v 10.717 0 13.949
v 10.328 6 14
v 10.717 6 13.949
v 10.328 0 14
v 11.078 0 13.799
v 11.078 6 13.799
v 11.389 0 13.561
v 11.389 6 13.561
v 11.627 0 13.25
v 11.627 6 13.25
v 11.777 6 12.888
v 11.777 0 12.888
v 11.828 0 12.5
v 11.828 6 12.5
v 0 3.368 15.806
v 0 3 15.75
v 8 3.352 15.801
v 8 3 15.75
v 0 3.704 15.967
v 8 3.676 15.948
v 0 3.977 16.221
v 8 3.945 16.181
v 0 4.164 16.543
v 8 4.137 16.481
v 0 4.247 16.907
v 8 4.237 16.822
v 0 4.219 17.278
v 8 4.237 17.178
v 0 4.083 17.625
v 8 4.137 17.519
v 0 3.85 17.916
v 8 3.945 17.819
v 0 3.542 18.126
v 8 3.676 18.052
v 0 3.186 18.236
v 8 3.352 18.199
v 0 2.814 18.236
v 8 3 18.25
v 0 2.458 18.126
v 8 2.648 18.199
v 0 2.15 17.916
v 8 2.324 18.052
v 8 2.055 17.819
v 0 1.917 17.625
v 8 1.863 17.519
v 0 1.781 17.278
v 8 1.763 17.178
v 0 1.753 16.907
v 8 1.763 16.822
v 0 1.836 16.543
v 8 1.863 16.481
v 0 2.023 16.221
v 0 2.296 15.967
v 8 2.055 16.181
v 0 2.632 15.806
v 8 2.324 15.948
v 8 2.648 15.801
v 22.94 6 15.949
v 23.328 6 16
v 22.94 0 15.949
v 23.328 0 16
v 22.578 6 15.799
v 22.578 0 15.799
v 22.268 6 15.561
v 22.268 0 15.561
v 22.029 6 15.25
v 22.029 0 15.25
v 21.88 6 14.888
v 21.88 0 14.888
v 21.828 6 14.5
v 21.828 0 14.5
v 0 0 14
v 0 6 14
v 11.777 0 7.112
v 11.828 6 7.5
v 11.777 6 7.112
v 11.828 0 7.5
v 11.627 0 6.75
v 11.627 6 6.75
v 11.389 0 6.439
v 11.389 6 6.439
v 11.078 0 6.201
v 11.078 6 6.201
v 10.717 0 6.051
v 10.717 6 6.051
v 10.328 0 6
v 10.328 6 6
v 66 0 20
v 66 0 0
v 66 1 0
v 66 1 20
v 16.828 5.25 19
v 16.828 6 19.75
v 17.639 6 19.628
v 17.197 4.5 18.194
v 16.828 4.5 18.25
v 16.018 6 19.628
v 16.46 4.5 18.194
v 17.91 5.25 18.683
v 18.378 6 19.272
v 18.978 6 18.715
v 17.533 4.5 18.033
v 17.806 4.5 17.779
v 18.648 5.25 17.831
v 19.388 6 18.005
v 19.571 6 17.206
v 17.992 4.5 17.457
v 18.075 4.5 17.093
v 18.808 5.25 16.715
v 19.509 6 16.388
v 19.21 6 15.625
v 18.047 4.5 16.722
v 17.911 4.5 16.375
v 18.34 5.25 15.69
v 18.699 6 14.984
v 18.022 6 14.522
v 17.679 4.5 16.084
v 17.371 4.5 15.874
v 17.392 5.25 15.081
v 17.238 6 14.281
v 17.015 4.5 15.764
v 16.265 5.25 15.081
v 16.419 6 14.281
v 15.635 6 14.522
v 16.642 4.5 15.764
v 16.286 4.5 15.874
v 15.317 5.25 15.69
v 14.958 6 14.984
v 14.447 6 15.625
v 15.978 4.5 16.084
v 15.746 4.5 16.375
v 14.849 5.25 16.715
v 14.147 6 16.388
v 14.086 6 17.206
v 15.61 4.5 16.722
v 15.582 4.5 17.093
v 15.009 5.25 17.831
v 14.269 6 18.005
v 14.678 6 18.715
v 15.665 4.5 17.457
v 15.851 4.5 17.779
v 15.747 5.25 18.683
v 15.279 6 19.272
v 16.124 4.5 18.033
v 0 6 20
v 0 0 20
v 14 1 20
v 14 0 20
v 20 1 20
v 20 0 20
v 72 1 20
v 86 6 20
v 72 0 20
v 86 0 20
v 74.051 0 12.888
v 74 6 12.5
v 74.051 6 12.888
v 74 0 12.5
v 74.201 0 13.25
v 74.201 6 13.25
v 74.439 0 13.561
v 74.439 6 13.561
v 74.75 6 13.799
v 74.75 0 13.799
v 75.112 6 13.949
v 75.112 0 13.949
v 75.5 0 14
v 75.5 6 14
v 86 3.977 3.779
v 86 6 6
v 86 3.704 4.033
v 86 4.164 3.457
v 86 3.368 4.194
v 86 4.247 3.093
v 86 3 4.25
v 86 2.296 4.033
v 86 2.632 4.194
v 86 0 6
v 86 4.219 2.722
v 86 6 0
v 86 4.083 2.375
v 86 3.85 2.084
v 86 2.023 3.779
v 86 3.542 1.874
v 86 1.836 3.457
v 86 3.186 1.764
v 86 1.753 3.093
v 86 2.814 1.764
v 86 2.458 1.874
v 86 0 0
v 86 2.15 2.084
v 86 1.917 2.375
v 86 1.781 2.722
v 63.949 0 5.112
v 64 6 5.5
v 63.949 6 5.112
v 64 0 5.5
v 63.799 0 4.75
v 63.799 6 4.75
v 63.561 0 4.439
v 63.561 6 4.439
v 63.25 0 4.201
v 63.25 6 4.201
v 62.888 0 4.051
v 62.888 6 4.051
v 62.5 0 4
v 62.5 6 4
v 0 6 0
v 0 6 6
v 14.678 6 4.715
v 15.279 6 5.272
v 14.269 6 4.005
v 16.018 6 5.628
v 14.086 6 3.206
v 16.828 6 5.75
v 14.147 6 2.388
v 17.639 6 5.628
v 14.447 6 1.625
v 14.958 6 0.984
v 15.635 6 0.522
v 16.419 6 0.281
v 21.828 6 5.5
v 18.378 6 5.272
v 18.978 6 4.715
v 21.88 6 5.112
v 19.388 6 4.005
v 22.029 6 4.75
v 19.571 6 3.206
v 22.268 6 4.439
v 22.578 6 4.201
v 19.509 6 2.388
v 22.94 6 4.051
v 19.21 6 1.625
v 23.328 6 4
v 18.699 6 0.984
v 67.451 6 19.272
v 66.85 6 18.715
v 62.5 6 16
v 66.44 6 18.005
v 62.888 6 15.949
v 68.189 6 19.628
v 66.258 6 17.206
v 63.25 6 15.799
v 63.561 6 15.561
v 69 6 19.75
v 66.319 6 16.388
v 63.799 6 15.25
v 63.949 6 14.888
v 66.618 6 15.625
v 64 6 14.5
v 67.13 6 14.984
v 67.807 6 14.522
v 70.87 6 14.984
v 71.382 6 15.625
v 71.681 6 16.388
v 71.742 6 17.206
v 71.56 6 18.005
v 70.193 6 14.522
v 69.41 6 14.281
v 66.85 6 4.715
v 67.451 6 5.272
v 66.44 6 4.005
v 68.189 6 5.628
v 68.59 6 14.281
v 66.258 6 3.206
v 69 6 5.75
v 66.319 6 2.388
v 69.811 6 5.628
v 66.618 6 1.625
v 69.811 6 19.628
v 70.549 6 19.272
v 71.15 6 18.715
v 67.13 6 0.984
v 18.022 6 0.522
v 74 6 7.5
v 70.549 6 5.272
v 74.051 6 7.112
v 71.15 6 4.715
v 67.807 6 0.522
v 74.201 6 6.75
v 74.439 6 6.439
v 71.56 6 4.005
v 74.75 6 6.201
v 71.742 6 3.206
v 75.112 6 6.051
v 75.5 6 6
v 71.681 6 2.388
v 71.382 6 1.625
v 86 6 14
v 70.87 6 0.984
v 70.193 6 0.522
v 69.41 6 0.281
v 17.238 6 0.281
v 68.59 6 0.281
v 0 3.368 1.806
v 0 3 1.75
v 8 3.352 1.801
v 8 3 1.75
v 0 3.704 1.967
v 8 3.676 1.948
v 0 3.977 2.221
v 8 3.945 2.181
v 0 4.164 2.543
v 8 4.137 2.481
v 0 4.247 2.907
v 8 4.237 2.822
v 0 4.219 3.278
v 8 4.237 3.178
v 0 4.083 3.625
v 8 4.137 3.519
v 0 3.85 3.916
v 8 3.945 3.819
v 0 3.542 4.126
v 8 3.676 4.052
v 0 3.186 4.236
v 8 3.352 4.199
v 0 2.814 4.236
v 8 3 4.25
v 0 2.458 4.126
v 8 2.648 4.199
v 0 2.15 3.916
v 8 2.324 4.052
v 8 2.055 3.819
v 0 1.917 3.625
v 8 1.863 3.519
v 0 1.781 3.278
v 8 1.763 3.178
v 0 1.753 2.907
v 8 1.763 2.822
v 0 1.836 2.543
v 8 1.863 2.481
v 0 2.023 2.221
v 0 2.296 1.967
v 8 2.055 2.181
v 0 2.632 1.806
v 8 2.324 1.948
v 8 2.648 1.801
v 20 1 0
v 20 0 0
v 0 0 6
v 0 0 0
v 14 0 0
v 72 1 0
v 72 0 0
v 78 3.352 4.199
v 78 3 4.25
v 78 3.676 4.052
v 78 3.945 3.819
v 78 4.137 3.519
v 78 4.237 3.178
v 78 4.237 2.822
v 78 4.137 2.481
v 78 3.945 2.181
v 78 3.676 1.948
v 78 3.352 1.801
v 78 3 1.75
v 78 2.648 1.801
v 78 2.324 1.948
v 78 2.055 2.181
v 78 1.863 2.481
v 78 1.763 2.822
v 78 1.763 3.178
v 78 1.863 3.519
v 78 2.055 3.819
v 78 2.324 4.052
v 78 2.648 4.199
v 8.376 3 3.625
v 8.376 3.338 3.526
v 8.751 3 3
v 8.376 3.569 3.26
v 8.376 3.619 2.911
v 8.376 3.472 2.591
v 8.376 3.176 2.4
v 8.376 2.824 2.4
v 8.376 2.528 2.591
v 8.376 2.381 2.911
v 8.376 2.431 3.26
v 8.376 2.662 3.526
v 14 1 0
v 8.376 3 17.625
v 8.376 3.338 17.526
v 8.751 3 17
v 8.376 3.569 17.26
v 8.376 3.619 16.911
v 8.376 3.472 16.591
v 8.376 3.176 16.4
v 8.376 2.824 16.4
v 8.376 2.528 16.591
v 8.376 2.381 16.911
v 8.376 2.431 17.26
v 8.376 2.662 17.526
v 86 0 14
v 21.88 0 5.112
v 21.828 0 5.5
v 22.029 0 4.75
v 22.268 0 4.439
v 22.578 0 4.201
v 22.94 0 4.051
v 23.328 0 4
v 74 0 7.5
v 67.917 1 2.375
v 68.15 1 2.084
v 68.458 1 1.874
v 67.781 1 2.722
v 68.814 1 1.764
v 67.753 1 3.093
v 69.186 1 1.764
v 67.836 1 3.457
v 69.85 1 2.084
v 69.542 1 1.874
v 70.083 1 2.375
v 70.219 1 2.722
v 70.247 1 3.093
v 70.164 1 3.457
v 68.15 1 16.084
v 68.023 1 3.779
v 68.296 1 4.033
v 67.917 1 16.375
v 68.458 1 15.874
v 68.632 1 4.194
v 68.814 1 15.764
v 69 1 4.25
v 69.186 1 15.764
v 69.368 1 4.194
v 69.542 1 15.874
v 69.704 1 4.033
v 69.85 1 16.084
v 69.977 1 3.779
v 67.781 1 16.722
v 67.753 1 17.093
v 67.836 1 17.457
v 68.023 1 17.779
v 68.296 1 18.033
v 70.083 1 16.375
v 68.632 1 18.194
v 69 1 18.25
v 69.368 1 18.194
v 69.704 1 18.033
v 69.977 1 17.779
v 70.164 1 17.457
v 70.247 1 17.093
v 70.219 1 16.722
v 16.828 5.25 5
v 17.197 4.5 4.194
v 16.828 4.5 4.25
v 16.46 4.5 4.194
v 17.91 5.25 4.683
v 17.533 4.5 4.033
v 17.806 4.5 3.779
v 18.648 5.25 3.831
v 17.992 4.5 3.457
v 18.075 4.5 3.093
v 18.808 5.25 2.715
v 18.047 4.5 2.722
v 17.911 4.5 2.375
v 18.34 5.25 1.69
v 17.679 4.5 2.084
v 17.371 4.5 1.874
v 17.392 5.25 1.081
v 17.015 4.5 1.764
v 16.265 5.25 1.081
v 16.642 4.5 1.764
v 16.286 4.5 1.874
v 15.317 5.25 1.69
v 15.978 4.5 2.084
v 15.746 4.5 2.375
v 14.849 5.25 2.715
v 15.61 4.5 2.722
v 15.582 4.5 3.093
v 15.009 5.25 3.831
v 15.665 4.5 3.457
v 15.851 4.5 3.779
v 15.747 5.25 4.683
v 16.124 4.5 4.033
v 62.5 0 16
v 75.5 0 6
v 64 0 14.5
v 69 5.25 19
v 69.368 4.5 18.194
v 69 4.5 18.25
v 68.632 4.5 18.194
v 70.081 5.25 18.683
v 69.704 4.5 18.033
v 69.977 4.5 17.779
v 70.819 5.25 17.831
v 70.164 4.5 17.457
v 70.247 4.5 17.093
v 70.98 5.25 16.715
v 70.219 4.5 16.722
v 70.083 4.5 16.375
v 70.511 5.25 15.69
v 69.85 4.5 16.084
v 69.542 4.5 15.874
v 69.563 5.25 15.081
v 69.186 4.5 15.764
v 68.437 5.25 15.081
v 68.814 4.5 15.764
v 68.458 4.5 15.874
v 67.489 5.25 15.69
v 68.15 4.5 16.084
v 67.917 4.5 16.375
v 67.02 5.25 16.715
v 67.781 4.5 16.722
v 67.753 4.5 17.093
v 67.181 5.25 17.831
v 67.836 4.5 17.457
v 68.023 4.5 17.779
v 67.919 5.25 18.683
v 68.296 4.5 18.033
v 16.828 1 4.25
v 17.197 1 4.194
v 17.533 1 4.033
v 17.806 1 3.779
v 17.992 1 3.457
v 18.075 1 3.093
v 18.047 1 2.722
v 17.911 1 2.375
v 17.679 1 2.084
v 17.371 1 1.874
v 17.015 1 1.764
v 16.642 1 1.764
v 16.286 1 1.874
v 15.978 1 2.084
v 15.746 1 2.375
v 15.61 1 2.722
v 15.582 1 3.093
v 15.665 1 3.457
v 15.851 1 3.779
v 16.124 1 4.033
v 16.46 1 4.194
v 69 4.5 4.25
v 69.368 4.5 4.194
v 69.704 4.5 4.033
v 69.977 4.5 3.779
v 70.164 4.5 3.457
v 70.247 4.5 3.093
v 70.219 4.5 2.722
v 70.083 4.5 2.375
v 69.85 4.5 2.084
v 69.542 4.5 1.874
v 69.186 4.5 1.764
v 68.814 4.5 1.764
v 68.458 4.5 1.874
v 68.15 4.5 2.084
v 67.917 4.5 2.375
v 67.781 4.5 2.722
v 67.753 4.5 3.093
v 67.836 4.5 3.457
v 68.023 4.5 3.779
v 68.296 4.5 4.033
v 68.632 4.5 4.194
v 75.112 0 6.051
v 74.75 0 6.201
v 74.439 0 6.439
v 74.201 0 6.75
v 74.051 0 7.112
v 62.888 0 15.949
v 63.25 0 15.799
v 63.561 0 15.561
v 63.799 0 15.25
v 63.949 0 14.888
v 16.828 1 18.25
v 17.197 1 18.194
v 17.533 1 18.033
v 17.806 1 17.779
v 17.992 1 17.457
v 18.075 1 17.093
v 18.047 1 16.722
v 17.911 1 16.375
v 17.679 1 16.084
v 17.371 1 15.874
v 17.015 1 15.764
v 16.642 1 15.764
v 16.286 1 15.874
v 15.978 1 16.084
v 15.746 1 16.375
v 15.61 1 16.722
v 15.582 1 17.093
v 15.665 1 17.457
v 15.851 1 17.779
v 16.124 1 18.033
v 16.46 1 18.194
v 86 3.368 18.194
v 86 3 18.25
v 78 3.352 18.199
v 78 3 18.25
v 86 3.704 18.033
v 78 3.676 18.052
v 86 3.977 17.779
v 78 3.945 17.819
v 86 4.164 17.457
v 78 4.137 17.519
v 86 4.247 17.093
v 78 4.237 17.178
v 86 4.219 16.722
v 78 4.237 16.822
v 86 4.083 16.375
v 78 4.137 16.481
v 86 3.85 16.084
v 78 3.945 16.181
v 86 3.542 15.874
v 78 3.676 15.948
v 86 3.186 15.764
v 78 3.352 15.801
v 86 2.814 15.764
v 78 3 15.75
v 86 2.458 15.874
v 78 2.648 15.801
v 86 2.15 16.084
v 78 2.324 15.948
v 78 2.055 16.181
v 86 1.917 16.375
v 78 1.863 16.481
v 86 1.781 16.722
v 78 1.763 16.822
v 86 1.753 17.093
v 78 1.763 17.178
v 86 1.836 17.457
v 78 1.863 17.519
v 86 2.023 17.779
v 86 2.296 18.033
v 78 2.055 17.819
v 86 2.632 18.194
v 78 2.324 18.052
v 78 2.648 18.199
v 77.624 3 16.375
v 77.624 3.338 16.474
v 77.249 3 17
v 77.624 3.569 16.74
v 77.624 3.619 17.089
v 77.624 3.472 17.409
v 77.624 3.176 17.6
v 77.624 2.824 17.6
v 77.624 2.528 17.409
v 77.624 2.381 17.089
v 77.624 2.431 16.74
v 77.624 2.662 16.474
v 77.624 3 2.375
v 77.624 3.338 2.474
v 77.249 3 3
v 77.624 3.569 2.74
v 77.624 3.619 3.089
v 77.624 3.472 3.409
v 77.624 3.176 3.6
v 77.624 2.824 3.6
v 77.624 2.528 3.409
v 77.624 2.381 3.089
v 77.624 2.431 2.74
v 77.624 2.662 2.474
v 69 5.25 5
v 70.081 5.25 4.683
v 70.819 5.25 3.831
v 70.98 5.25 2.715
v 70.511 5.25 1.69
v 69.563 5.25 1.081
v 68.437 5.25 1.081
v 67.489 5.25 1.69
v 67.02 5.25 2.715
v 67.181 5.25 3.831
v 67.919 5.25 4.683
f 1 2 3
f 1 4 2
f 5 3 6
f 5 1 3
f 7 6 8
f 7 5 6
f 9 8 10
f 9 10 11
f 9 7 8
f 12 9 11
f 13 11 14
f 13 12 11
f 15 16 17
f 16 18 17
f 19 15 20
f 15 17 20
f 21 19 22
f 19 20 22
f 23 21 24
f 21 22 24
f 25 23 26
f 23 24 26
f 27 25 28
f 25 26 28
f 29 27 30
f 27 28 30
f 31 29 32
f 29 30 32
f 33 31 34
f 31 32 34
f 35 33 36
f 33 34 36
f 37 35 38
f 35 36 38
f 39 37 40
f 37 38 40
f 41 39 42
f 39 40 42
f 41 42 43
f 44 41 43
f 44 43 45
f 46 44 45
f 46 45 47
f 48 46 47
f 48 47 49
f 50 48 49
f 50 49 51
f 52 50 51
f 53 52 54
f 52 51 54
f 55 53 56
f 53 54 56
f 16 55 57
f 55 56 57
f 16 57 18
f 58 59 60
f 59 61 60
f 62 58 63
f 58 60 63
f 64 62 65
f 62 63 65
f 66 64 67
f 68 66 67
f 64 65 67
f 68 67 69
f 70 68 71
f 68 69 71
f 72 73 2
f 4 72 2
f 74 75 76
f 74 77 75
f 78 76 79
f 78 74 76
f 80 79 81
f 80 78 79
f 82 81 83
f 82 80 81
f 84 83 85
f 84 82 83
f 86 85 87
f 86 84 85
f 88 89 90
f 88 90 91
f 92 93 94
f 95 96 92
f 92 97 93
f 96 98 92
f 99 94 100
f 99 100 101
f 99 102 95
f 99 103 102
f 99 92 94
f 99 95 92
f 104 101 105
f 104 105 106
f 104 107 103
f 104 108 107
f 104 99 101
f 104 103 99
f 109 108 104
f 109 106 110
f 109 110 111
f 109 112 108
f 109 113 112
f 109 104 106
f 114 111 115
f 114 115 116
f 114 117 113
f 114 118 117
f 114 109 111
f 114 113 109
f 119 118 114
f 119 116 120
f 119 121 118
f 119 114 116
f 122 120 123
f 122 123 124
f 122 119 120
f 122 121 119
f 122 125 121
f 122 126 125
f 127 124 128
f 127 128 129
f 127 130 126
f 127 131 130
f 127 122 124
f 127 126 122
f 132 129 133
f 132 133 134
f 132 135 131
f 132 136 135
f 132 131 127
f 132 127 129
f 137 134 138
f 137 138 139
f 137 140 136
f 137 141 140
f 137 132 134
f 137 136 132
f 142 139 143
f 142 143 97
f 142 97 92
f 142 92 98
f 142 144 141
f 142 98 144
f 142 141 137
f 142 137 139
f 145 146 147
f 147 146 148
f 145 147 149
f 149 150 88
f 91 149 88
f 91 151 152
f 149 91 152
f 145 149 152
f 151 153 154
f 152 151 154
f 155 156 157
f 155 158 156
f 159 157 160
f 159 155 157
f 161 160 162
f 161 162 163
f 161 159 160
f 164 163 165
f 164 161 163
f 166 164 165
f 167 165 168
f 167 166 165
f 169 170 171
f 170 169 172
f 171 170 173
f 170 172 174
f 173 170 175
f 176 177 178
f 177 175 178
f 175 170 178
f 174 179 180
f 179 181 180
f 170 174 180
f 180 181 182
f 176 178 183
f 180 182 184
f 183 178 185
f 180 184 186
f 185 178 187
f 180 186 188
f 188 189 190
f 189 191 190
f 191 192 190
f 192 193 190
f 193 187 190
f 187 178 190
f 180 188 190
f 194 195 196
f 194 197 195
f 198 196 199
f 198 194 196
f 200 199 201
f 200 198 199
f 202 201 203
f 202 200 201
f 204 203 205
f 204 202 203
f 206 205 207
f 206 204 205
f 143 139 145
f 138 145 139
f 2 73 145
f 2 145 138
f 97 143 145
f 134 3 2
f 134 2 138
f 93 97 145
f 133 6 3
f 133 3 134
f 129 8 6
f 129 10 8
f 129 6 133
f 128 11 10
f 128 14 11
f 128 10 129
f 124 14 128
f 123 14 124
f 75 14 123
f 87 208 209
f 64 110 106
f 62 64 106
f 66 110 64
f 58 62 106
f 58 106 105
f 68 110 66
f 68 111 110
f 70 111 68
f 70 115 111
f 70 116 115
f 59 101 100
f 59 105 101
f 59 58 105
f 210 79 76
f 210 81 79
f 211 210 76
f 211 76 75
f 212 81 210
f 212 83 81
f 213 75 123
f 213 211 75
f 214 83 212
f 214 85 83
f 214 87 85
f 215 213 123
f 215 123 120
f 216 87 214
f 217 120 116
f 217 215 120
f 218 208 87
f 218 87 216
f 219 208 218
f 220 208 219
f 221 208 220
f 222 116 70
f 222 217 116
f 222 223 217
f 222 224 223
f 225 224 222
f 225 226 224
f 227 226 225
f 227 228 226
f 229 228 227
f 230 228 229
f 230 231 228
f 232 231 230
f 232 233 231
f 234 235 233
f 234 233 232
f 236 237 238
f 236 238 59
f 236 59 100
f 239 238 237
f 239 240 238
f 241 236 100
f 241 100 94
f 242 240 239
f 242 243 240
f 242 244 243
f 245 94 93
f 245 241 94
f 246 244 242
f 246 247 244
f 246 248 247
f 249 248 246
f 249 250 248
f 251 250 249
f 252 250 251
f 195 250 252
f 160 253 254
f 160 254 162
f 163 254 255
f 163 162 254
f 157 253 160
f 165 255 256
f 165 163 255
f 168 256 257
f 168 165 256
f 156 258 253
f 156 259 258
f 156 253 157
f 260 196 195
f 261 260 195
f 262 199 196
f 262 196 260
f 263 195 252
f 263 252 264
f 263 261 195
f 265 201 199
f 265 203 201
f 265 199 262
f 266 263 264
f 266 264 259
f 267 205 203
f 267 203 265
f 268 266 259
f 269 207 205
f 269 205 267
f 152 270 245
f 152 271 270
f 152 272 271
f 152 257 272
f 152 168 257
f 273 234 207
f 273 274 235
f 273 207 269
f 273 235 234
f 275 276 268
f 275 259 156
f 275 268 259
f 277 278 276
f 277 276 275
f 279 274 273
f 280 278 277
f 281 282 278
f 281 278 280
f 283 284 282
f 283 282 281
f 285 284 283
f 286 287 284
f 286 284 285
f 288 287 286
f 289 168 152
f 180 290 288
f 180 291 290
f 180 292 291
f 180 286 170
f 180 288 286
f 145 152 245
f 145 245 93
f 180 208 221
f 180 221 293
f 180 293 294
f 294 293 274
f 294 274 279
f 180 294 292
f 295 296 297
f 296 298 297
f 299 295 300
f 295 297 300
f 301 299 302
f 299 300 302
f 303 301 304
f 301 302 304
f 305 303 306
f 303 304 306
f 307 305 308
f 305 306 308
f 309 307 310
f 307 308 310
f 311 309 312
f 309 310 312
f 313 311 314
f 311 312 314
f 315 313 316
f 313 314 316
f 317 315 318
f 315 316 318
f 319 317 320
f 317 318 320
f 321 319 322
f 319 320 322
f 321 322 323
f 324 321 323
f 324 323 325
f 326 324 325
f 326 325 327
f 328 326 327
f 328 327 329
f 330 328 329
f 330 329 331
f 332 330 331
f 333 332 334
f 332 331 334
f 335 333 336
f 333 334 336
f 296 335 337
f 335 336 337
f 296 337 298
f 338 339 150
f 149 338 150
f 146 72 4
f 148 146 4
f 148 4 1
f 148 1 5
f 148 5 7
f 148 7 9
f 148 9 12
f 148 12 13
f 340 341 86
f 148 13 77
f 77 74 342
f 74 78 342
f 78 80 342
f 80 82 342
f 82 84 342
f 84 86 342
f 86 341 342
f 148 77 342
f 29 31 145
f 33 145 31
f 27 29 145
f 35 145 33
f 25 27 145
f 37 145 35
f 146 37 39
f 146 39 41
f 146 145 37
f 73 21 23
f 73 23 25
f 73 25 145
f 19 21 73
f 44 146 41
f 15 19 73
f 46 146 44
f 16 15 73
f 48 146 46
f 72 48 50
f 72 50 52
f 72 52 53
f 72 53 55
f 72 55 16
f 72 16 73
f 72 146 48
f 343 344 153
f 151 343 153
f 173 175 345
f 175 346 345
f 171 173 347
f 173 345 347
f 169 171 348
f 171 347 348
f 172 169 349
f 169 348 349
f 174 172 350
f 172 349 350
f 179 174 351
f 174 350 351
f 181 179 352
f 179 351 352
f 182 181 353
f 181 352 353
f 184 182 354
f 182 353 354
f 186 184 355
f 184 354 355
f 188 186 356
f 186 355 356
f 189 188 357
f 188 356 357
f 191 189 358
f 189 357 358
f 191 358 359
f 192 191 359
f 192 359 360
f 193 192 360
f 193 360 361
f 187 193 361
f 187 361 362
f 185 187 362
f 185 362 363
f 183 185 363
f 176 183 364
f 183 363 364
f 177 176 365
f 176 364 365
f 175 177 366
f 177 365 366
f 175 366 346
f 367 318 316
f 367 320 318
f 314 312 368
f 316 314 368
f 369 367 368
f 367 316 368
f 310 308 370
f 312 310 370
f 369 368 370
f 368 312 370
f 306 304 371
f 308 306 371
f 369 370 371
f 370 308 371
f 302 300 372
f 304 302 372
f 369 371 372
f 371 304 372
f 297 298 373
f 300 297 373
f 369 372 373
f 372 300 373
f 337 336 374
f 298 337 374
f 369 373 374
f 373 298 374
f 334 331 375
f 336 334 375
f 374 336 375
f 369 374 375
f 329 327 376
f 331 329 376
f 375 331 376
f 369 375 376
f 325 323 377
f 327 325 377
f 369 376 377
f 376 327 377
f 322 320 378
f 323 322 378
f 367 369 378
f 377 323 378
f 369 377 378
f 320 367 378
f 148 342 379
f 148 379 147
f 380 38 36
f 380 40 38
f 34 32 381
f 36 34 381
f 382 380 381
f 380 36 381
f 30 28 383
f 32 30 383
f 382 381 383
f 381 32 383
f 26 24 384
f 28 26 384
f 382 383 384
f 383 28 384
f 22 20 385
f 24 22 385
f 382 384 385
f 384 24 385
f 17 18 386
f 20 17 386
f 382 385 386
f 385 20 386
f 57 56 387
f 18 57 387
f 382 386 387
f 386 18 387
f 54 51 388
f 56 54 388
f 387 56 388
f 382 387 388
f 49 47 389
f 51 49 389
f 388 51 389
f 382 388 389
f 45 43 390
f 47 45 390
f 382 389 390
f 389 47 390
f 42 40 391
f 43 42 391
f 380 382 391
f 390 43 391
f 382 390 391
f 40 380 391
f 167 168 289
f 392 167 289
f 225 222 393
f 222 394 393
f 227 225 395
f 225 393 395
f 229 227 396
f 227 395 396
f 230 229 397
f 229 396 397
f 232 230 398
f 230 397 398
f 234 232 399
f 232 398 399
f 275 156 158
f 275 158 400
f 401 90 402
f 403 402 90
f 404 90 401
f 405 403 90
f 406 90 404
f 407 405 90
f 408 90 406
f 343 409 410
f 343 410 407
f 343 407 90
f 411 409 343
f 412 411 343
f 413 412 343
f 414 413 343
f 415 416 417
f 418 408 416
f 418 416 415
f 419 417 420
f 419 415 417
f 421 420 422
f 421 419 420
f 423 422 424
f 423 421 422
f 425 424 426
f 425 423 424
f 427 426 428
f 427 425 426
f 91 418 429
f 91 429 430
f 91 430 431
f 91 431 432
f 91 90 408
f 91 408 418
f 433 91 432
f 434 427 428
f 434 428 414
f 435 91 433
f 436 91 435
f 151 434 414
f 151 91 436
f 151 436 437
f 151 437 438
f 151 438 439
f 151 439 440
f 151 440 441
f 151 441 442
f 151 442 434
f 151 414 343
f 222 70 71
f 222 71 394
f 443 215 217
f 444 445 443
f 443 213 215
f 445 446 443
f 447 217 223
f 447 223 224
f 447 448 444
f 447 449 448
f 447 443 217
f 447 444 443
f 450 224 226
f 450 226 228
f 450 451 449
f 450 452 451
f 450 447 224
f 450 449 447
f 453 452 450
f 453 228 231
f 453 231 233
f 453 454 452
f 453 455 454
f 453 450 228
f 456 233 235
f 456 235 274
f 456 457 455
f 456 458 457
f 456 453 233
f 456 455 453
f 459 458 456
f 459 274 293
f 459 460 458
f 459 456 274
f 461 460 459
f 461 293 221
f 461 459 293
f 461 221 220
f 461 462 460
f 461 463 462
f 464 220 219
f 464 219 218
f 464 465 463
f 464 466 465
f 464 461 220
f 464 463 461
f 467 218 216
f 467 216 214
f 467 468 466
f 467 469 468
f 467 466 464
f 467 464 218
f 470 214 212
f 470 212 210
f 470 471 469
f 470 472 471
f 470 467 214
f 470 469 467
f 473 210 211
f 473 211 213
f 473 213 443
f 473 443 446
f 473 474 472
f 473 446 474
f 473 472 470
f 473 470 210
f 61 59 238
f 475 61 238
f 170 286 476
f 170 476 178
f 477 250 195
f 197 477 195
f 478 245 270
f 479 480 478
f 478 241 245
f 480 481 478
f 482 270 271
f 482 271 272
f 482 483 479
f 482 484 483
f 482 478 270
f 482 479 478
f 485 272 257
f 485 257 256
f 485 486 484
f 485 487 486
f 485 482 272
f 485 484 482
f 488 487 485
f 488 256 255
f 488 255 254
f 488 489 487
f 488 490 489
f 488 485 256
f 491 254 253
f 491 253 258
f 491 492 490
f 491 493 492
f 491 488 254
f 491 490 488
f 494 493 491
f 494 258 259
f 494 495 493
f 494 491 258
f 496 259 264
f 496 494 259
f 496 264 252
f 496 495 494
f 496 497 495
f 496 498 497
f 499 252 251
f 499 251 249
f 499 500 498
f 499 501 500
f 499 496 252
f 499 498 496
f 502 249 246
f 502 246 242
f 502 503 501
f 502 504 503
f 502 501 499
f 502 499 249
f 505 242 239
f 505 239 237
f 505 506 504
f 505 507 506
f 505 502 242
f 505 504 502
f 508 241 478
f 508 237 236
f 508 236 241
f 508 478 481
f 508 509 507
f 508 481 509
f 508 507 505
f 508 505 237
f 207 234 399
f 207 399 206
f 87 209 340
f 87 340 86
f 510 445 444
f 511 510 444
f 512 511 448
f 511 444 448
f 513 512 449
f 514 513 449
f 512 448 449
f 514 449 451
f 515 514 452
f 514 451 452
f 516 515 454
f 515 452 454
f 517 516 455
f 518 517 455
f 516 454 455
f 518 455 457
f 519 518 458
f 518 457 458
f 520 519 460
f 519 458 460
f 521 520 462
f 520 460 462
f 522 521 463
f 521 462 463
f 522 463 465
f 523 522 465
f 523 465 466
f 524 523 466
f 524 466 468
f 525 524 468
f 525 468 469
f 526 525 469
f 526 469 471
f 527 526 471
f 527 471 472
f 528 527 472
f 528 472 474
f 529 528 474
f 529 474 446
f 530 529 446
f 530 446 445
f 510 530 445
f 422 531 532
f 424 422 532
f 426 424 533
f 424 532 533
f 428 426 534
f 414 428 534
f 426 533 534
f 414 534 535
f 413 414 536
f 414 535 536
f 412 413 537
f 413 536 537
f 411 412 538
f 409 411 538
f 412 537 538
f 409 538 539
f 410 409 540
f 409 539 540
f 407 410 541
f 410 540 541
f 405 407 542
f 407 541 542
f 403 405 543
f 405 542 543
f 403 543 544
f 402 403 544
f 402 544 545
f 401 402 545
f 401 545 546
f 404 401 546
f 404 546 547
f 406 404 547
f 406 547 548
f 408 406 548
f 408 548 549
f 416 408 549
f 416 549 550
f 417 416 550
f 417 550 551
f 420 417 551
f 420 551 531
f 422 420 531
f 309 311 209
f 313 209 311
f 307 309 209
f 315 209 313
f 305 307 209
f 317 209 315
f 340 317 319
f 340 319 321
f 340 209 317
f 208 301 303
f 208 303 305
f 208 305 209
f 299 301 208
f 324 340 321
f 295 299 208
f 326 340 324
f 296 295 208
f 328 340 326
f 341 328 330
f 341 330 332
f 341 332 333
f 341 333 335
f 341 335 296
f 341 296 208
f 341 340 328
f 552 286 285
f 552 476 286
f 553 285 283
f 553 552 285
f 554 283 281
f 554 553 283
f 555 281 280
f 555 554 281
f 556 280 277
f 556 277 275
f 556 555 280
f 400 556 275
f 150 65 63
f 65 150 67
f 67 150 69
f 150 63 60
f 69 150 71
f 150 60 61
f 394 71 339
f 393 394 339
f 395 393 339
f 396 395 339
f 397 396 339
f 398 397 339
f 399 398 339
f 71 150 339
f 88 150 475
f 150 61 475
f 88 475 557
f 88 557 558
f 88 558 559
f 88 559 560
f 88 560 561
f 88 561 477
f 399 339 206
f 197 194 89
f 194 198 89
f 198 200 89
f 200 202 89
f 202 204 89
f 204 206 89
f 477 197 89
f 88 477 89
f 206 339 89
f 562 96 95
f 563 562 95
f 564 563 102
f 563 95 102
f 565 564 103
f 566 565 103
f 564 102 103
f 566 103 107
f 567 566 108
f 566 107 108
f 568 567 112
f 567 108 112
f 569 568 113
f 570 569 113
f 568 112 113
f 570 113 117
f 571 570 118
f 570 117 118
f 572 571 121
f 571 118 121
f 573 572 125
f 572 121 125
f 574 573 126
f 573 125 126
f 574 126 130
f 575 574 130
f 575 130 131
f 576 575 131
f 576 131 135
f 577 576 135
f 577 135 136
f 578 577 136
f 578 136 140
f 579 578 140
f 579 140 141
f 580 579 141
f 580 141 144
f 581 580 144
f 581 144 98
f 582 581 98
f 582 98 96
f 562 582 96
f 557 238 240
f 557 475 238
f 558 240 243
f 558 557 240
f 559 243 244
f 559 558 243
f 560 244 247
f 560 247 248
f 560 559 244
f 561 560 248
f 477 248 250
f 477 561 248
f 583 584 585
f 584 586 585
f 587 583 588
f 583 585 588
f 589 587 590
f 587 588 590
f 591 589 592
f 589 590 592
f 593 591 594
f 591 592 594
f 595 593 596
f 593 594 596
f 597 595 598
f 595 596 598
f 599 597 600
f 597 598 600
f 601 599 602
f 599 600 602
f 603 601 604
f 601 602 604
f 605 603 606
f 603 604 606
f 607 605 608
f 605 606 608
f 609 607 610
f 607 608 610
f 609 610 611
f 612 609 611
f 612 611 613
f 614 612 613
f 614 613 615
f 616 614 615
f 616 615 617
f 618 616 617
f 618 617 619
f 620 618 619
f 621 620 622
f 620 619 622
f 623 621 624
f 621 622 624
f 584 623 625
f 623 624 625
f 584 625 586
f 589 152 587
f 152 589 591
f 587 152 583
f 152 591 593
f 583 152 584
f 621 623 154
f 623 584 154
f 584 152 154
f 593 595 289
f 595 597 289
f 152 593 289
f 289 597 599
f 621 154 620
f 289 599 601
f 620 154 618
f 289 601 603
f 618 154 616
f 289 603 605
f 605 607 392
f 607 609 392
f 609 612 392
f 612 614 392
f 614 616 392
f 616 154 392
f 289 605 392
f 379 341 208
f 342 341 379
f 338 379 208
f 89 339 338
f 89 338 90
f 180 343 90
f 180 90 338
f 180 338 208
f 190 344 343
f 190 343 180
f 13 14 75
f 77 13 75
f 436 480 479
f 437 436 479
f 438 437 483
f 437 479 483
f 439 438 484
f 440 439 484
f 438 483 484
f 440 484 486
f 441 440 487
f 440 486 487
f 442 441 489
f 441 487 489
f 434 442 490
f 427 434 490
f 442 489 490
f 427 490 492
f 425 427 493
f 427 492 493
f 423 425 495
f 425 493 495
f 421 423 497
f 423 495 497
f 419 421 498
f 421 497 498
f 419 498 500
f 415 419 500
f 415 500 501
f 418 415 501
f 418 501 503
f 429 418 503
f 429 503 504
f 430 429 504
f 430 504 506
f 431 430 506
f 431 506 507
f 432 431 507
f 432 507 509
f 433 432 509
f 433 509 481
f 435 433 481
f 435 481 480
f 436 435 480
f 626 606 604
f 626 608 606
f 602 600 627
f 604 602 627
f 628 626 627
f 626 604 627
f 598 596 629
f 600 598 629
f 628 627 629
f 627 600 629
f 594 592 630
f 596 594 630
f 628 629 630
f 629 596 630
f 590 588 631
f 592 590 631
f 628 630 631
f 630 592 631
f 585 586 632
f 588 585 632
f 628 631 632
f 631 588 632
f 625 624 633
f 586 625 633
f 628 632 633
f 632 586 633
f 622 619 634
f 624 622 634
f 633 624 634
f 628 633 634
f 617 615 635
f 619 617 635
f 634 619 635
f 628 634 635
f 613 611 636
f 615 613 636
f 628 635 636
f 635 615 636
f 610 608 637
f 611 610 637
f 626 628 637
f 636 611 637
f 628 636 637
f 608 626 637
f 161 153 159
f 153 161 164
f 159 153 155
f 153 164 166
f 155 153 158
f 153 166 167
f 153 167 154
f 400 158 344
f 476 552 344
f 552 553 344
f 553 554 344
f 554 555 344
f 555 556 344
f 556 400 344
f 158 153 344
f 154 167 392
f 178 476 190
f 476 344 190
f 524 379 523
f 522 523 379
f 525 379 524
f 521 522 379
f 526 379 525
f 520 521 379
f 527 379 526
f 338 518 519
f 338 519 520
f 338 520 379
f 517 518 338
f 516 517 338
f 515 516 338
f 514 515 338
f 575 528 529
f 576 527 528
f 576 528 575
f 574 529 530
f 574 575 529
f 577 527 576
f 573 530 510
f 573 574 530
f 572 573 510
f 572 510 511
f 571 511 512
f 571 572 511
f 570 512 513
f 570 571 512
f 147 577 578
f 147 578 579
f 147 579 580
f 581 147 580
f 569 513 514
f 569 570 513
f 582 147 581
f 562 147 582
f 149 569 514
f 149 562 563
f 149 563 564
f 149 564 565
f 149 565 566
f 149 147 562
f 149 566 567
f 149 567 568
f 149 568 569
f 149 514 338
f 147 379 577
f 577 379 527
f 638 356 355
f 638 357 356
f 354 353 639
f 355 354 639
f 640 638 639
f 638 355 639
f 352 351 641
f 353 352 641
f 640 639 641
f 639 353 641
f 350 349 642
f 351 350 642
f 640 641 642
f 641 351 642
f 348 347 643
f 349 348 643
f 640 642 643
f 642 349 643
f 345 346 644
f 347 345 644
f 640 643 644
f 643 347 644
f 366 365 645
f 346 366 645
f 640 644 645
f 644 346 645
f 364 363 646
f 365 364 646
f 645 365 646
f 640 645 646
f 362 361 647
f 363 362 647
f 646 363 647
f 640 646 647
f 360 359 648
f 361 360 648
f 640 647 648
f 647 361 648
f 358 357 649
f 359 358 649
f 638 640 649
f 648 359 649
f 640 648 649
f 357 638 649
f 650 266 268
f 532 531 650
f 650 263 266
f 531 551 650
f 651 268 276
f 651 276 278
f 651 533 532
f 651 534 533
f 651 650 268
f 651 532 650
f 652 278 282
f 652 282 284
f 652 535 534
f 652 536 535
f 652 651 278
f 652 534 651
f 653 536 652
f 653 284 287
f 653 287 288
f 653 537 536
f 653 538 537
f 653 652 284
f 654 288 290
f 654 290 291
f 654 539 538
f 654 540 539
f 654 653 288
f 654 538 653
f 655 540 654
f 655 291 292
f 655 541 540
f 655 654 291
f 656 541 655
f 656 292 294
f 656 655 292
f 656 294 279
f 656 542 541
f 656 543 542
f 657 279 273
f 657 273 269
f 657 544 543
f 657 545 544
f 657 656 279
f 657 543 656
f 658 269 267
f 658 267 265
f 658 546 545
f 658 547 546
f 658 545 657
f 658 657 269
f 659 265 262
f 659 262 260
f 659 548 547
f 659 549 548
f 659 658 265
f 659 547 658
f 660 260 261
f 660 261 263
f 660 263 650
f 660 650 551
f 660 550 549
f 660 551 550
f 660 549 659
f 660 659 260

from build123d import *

# Parameters (mm, degrees)
SKETCH2_W                   = 86
SKETCH2_H                   = 20
BOSS_EXTRUDE1_DEPTH         = 6
TAP_DRILL_FOR_M3_TAP2_D     = 2.5
TAP_DRILL_FOR_M3_TAP2_DEPTH = 8
TAP_DRILL_FOR_M3_TAP2_TIP   = 0.751075774
TAP_DRILL_FOR_M3_TAP1_D     = 2.5
TAP_DRILL_FOR_M3_TAP1_DEPTH = 8
TAP_DRILL_FOR_M3_TAP1_TIP   = 0.751075774
SKETCH7_W                   = 6
SKETCH7_H                   = 20
CUT_EXTRUDE1_DEPTH          = 1
TAP_DRILL_FOR_M3X0_5_TAP1_D = 2.5
CHAMFER1_SIZE               = 1.5
CUT_EXTRUDE2_REACH          = 90.499
SKETCH9_W                   = 42.171572875
SKETCH9_H                   = 12
SKETCH9_W_2                 = 11.828427125
SKETCH9_H_2                 = 8
SKETCH9_W_3                 = 12
FILLET1_R                   = 1.5


with BuildPart() as part:
    # Sketch2 → Boss-Extrude1 (new body)
    with BuildSketch(Plane(origin=(0, 0, 0), x_dir=(1, 0, 0), z_dir=(0, 1, 0))):
        with Locations((43, -10)):
            Rectangle(SKETCH2_W, SKETCH2_H)
    extrude(amount=BOSS_EXTRUDE1_DEPTH)

    # Tap Drill for M3 Tap2
    with Locations(Plane(origin=(86, 0.779165189, 7.640466368), x_dir=(0, 0, -1), z_dir=(1, 0, 0))):
        with Locations((-9.359533632, 2.220834811), (4.640466368, 2.220834811)):
            Hole(TAP_DRILL_FOR_M3_TAP2_D / 2, depth=TAP_DRILL_FOR_M3_TAP2_DEPTH)
            with Locations((0, 0, -(TAP_DRILL_FOR_M3_TAP2_DEPTH + TAP_DRILL_FOR_M3_TAP2_TIP / 2))):  # 118° drill point
                Cone(0, TAP_DRILL_FOR_M3_TAP2_D / 2, TAP_DRILL_FOR_M3_TAP2_TIP, mode=Mode.SUBTRACT)

    # Tap Drill for M3 Tap1
    with Locations(Plane.ZY):
        with Locations((3, 3), (17, 3)):
            Hole(TAP_DRILL_FOR_M3_TAP1_D / 2, depth=TAP_DRILL_FOR_M3_TAP1_DEPTH)
            with Locations((0, 0, -(TAP_DRILL_FOR_M3_TAP1_DEPTH + TAP_DRILL_FOR_M3_TAP1_TIP / 2))):  # 118° drill point
                Cone(0, TAP_DRILL_FOR_M3_TAP1_D / 2, TAP_DRILL_FOR_M3_TAP1_TIP, mode=Mode.SUBTRACT)

    # Sketch7 → Cut-Extrude1 (cut)
    with BuildSketch(Plane.XZ):
        with Locations((17, 10)):
            Rectangle(SKETCH7_W, SKETCH7_H)
        with Locations((69, 10)):
            Rectangle(SKETCH7_W, SKETCH7_H)
    extrude(amount=-CUT_EXTRUDE1_DEPTH, mode=Mode.SUBTRACT)

    # Tap Drill for M3x0.5 Tap1 (through all)
    with Locations(Plane(origin=(16.828427125, 1, 17), x_dir=(0, 0, -1), z_dir=(0, -1, 0))):
        with Locations((0, 0), (14, 0), (0, 52.171572875), (14, 52.171572875)):
            Hole(TAP_DRILL_FOR_M3X0_5_TAP1_D / 2)

    # Chamfer1
    chamfer1_edges = [part.edges().sort_by_distance(p)[0] for p in [
        (69, 6, 1.75),
        (69, 6, 15.75),
        (16.828427125, 6, 1.75),
        (16.828427125, 6, 15.75),
    ]]
    chamfer(chamfer1_edges, length=CHAMFER1_SIZE)

    # Sketch9 → Cut-Extrude2 (cut, up to next)
    with BuildSketch(Plane(origin=(0, 6, 0), x_dir=(1, 0, 0), z_dir=(0, 1, 0)), mode=Mode.PRIVATE) as cut_extrude2_sk1:
        with Locations((42.914213563, -10)):
            Rectangle(SKETCH9_W, SKETCH9_H)
    cut_extrude2_tool1 = extrude(cut_extrude2_sk1.sketch, amount=-CUT_EXTRUDE2_REACH, mode=Mode.PRIVATE) & part.part
    # Sketch9 → Cut-Extrude2 (cut, up to next)
    with BuildSketch(Plane(origin=(0, 6, 0), x_dir=(1, 0, 0), z_dir=(0, 1, 0)), mode=Mode.PRIVATE) as cut_extrude2_sk2:
        with Locations((5.914213563, -10)):
            Rectangle(SKETCH9_W_2, SKETCH9_H_2)
    cut_extrude2_tool2 = extrude(cut_extrude2_sk2.sketch, amount=-CUT_EXTRUDE2_REACH, mode=Mode.PRIVATE) & part.part
    # Sketch9 → Cut-Extrude2 (cut, up to next)
    with BuildSketch(Plane(origin=(0, 6, 0), x_dir=(1, 0, 0), z_dir=(0, 1, 0)), mode=Mode.PRIVATE) as cut_extrude2_sk3:
        with Locations((80, -10)):
            Rectangle(SKETCH9_W_3, SKETCH9_H_2)
    cut_extrude2_tool3 = extrude(cut_extrude2_sk3.sketch, amount=-CUT_EXTRUDE2_REACH, mode=Mode.PRIVATE) & part.part
    add(cut_extrude2_tool1.solids().sort_by_distance((42.914214, 6, 10))[0], mode=Mode.SUBTRACT)
    add(cut_extrude2_tool2.solids().sort_by_distance((5.914214, 6, 10))[0], mode=Mode.SUBTRACT)
    add(cut_extrude2_tool3.solids().sort_by_distance((80, 6, 10))[0], mode=Mode.SUBTRACT)

    # Fillet1
    fillet1_edges = [part.edges().sort_by_distance(p)[0] for p in [
        (21.828427125, 3, 16),
        (21.828427125, 3, 4),
        (64, 3, 4),
        (64, 3, 16),
        (11.828427125, 3, 6),
        (11.828427125, 3, 14),
        (74, 3, 14),
        (74, 3, 6),
    ]]
    fillet(fillet1_edges, radius=FILLET1_R)


solid = part.part
